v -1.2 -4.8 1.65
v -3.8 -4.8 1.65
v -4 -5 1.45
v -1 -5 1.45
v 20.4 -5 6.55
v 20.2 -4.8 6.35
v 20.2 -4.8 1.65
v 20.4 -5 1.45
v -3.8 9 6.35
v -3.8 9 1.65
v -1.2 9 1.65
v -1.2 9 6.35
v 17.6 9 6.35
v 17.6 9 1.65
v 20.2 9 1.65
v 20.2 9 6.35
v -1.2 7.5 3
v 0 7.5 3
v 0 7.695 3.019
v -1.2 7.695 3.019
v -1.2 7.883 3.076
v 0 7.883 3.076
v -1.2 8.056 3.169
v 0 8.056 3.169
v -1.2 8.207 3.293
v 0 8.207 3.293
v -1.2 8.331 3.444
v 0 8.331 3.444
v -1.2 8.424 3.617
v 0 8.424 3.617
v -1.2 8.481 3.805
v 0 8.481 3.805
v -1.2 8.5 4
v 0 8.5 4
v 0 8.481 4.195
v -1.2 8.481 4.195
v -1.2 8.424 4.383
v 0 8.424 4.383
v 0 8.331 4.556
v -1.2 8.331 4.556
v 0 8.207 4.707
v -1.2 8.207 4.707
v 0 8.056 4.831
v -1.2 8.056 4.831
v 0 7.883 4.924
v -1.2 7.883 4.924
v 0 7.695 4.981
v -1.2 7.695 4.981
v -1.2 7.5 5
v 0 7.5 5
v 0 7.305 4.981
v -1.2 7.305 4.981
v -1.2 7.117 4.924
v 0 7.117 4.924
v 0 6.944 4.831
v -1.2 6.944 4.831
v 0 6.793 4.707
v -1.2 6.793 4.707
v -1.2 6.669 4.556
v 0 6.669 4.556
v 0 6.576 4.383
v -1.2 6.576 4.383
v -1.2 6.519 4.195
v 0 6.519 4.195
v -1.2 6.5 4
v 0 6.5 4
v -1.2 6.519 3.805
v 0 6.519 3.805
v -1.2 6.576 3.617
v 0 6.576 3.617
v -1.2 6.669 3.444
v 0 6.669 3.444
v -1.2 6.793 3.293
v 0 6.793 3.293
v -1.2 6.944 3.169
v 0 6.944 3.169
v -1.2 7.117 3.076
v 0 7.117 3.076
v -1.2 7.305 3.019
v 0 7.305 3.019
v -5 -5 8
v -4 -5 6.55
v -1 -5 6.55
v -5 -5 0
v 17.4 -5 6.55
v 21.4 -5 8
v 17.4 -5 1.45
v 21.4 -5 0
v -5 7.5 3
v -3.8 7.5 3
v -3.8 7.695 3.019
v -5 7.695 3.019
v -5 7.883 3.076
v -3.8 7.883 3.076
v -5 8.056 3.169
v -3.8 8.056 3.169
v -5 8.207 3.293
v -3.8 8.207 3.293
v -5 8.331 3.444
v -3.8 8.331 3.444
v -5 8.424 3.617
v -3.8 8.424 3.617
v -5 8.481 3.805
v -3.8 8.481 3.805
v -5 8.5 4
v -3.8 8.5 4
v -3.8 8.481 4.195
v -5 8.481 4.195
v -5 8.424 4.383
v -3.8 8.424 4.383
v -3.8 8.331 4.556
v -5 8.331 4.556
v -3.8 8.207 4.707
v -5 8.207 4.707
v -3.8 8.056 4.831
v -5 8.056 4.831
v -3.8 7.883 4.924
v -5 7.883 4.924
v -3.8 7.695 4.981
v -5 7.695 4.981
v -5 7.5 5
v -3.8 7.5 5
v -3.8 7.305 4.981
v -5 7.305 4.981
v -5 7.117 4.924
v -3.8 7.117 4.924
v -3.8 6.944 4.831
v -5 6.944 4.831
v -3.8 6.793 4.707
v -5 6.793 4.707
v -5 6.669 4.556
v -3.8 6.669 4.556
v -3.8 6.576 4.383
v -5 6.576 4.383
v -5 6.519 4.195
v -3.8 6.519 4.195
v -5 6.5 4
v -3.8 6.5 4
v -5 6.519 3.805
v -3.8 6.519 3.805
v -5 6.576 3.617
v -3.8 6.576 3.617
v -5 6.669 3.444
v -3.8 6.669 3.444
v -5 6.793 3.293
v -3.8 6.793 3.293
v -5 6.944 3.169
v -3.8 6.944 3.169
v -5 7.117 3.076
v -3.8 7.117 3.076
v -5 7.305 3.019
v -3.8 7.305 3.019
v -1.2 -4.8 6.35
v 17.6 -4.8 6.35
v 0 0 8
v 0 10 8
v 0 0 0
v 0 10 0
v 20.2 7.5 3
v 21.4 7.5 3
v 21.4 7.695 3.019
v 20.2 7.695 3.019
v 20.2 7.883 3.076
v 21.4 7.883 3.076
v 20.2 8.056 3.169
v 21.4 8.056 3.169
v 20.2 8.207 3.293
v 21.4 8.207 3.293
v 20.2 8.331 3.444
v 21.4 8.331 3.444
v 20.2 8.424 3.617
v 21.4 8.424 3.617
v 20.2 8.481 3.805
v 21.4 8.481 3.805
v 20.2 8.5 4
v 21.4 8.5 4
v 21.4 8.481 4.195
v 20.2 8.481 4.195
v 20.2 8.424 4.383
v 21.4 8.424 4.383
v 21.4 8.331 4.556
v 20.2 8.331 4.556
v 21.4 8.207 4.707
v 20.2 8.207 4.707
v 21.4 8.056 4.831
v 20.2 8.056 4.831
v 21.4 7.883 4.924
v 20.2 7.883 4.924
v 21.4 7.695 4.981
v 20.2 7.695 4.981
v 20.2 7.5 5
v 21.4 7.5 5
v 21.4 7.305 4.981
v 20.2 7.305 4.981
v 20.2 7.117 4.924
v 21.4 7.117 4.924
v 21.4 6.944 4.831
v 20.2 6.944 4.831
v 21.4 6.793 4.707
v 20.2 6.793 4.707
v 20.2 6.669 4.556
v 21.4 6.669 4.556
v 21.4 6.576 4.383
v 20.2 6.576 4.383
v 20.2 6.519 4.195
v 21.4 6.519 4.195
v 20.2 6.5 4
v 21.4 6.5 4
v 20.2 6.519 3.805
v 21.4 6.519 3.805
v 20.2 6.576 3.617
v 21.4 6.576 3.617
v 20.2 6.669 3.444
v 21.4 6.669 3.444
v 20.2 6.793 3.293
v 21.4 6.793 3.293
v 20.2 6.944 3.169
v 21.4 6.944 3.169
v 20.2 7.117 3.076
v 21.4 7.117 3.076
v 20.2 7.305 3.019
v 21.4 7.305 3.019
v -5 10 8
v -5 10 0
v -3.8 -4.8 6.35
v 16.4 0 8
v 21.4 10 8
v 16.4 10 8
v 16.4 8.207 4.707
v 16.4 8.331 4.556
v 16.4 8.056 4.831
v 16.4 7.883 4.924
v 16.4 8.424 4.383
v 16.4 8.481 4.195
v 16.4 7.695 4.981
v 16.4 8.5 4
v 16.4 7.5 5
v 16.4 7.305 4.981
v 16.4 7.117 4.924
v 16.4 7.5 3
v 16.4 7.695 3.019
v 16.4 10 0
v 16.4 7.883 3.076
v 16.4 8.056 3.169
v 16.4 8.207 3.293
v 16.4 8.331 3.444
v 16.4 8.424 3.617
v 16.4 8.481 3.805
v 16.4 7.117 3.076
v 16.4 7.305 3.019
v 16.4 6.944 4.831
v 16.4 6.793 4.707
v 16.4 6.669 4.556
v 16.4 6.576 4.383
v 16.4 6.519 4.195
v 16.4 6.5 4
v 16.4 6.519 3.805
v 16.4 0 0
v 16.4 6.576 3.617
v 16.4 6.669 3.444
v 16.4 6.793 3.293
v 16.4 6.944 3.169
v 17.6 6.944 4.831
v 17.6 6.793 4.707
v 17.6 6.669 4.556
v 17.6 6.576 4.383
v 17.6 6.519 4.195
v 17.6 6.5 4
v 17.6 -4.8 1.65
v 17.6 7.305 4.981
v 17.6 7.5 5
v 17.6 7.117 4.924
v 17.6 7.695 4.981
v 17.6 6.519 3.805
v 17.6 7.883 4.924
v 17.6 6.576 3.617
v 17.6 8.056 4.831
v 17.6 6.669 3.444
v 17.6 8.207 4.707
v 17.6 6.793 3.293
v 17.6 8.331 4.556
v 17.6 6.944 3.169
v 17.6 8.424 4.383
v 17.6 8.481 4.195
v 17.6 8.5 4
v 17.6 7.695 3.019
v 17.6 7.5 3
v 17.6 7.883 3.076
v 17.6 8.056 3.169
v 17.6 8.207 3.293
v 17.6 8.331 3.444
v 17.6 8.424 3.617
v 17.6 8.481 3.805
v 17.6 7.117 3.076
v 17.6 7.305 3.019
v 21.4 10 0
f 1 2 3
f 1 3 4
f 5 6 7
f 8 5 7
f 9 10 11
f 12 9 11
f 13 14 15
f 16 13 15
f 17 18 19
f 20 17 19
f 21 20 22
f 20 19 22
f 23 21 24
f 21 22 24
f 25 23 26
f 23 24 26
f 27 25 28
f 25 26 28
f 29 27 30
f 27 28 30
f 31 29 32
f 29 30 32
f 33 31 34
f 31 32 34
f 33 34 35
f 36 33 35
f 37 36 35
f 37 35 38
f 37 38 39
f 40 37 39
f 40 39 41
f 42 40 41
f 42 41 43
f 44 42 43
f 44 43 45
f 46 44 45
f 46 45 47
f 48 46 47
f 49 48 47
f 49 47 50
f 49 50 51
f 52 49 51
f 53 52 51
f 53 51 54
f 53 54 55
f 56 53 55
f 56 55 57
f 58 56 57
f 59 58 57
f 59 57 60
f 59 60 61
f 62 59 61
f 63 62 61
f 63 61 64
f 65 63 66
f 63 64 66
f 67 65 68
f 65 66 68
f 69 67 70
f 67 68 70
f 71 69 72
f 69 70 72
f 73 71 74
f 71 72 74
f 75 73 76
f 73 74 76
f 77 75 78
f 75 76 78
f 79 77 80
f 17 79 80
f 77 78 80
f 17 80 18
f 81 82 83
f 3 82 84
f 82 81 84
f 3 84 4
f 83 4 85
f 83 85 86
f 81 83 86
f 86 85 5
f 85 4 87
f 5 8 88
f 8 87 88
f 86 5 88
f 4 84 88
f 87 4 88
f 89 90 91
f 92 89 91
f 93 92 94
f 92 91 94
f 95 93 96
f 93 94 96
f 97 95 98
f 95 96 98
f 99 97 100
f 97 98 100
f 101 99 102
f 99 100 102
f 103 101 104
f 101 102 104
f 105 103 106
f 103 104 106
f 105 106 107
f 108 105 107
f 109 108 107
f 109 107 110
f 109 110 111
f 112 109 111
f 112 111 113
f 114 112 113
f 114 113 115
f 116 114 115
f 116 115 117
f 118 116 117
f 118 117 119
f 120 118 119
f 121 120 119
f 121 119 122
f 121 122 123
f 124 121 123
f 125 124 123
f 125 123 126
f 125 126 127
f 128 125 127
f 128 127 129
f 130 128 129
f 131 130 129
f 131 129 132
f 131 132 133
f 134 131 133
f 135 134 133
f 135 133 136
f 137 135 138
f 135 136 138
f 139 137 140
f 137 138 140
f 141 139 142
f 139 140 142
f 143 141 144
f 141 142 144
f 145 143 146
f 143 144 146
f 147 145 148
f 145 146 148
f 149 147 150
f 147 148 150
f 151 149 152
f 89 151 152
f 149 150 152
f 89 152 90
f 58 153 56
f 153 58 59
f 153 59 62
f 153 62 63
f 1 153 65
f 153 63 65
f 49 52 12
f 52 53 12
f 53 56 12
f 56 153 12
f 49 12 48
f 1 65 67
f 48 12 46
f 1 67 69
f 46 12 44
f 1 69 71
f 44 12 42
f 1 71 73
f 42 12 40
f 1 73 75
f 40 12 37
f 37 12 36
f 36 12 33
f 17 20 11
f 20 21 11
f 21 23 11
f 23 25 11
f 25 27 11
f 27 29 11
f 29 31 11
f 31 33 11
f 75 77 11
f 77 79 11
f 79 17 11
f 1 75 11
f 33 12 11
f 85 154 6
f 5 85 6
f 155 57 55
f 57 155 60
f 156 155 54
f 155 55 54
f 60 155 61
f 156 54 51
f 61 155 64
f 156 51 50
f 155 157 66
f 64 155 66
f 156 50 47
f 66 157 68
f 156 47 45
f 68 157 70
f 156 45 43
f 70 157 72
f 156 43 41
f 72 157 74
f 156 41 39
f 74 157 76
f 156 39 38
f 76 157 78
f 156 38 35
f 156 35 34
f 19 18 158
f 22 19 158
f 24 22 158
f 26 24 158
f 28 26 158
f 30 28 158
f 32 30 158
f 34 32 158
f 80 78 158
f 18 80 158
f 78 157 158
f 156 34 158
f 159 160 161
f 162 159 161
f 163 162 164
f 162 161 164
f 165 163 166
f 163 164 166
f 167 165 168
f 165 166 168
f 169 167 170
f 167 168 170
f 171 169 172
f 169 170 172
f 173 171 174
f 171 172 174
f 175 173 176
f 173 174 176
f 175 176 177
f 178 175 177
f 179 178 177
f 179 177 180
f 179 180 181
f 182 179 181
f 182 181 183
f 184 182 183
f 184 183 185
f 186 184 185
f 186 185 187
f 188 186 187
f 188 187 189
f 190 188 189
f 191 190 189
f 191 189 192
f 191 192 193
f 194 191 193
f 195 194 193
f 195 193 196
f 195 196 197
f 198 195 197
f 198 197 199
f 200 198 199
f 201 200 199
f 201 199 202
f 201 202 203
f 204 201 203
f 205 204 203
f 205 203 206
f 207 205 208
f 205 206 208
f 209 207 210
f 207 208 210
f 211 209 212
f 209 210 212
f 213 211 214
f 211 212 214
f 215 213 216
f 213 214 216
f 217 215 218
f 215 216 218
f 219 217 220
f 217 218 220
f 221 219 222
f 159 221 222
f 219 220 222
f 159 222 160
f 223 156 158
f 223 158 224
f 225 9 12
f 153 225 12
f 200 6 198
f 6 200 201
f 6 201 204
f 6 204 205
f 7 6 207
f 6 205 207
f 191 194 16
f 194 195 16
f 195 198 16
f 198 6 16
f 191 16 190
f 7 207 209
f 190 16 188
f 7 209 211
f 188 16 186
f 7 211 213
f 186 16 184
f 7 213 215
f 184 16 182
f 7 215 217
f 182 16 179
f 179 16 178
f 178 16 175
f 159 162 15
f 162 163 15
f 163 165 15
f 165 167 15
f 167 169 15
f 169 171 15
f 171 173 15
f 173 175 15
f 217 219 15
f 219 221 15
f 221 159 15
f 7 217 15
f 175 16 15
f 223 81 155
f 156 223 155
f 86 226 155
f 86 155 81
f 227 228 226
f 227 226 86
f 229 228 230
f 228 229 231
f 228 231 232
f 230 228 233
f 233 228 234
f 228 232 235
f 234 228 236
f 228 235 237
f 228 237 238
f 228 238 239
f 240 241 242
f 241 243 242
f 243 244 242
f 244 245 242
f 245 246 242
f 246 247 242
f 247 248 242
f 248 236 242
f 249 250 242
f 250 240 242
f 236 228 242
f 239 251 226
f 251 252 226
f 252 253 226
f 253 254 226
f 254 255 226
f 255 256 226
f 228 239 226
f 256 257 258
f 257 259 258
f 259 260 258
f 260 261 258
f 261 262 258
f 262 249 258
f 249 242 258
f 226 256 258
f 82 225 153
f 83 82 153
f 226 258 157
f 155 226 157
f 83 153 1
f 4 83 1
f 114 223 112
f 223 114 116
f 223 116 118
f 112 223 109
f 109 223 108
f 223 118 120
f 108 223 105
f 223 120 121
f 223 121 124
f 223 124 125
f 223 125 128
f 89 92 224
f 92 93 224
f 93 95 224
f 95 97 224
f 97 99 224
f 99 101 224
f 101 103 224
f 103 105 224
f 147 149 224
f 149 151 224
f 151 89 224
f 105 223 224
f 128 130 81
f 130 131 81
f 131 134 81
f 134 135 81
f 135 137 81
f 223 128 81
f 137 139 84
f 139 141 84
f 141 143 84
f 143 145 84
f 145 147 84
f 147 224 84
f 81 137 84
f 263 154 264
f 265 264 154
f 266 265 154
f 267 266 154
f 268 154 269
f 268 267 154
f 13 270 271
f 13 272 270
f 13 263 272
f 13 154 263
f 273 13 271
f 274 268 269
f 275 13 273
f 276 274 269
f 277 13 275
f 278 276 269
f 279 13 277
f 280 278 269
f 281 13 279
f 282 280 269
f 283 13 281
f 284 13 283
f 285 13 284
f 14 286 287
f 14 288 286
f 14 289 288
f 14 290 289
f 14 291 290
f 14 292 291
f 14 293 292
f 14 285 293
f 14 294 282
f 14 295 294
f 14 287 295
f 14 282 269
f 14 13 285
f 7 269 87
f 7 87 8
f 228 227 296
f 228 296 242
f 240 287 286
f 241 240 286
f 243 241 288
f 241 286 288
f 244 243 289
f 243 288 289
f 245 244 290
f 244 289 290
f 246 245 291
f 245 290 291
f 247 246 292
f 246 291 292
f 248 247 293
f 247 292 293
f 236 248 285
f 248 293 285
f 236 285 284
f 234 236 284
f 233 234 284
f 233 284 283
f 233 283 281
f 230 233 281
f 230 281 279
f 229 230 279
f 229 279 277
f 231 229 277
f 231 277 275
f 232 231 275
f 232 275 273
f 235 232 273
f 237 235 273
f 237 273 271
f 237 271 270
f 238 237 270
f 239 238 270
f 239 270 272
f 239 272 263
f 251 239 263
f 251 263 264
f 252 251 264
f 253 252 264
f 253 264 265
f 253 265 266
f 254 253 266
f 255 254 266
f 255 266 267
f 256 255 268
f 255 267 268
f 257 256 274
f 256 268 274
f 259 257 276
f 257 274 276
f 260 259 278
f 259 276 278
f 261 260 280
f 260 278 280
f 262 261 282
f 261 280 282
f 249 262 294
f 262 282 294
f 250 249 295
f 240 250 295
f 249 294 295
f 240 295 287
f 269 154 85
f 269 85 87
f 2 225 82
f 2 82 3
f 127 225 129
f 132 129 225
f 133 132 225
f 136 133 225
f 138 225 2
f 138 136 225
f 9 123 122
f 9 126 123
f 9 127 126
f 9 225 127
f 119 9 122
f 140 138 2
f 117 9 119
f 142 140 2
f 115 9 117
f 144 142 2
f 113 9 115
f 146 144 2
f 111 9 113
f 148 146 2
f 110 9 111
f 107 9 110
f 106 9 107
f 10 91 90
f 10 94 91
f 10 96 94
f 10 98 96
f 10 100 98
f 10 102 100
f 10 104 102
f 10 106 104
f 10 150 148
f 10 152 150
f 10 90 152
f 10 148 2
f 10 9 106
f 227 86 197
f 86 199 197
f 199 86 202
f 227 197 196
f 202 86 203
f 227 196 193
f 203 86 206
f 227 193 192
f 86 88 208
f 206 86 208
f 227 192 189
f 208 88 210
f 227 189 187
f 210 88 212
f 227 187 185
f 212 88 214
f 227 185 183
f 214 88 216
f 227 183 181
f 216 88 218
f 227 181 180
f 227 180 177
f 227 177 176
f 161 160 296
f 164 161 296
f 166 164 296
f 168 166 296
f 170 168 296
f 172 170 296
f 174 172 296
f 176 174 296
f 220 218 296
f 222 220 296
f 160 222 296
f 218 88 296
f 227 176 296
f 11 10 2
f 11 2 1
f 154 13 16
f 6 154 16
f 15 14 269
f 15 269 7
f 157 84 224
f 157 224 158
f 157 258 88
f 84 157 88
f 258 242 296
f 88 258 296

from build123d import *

# Parameters (mm, degrees)
EXTRUDE_1_DEPTH     = 8
CUT_EXTRUDE_START   = -1
SKETCH_3_W          = 2.6
SKETCH_3_H          = 4.7
CUT_EXTRUDE_1_DEPTH = 15
SKETCH_4_R          = 1
CUT_EXTRUDE_2_DEPTH = 27.4
CHAMFER_1_SIZE      = 0.2


with BuildPart() as part:
    # Эскиз2 → Бобышка-Вытянуть1 (new body)
    with BuildSketch(Plane.XY):
        Polygon((21.4, -5), (21.4, 10), (16.4, 10), (16.4, 0), (0, 0), (0, 10), (-5, 10), (-5, -5), align=None)
    extrude(amount=EXTRUDE_1_DEPTH)

    # Эскиз3 → Вырез-Вытянуть1 (cut, through all)
    with BuildSketch(Plane(origin=(0, 10, 0), x_dir=(1, 0, 0), z_dir=(0, 1, 0)).offset(CUT_EXTRUDE_START)):
        with Locations((-2.5, -4)):
            Rectangle(SKETCH_3_W, SKETCH_3_H)
        with Locations((18.9, -4)):
            Rectangle(SKETCH_3_W, SKETCH_3_H)
    extrude(amount=-CUT_EXTRUDE_1_DEPTH, mode=Mode.SUBTRACT)

    # Эскиз4 → Вырез-Вытянуть2 (cut, through all)
    with BuildSketch(Plane(origin=(21.4, 0, 0), x_dir=(0, 0, -1), z_dir=(1, 0, 0))):
        with Locations((-4, 7.5)):
            Circle(SKETCH_4_R)
    extrude(amount=-CUT_EXTRUDE_2_DEPTH, mode=Mode.SUBTRACT)

    # Фаска1
    chamfer_1_edges = [part.edges().sort_by_distance(p)[0] for p in [
        (-1.2, -5, 4),
        (-2.5, -5, 6.35),
        (-3.8, -5, 4),
        (-2.5, -5, 1.65),
        (20.2, -5, 4),
        (18.9, -5, 6.35),
        (17.6, -5, 4),
        (18.9, -5, 1.65),
    ]]
    chamfer(chamfer_1_edges, length=CHAMFER_1_SIZE)


solid = part.part
